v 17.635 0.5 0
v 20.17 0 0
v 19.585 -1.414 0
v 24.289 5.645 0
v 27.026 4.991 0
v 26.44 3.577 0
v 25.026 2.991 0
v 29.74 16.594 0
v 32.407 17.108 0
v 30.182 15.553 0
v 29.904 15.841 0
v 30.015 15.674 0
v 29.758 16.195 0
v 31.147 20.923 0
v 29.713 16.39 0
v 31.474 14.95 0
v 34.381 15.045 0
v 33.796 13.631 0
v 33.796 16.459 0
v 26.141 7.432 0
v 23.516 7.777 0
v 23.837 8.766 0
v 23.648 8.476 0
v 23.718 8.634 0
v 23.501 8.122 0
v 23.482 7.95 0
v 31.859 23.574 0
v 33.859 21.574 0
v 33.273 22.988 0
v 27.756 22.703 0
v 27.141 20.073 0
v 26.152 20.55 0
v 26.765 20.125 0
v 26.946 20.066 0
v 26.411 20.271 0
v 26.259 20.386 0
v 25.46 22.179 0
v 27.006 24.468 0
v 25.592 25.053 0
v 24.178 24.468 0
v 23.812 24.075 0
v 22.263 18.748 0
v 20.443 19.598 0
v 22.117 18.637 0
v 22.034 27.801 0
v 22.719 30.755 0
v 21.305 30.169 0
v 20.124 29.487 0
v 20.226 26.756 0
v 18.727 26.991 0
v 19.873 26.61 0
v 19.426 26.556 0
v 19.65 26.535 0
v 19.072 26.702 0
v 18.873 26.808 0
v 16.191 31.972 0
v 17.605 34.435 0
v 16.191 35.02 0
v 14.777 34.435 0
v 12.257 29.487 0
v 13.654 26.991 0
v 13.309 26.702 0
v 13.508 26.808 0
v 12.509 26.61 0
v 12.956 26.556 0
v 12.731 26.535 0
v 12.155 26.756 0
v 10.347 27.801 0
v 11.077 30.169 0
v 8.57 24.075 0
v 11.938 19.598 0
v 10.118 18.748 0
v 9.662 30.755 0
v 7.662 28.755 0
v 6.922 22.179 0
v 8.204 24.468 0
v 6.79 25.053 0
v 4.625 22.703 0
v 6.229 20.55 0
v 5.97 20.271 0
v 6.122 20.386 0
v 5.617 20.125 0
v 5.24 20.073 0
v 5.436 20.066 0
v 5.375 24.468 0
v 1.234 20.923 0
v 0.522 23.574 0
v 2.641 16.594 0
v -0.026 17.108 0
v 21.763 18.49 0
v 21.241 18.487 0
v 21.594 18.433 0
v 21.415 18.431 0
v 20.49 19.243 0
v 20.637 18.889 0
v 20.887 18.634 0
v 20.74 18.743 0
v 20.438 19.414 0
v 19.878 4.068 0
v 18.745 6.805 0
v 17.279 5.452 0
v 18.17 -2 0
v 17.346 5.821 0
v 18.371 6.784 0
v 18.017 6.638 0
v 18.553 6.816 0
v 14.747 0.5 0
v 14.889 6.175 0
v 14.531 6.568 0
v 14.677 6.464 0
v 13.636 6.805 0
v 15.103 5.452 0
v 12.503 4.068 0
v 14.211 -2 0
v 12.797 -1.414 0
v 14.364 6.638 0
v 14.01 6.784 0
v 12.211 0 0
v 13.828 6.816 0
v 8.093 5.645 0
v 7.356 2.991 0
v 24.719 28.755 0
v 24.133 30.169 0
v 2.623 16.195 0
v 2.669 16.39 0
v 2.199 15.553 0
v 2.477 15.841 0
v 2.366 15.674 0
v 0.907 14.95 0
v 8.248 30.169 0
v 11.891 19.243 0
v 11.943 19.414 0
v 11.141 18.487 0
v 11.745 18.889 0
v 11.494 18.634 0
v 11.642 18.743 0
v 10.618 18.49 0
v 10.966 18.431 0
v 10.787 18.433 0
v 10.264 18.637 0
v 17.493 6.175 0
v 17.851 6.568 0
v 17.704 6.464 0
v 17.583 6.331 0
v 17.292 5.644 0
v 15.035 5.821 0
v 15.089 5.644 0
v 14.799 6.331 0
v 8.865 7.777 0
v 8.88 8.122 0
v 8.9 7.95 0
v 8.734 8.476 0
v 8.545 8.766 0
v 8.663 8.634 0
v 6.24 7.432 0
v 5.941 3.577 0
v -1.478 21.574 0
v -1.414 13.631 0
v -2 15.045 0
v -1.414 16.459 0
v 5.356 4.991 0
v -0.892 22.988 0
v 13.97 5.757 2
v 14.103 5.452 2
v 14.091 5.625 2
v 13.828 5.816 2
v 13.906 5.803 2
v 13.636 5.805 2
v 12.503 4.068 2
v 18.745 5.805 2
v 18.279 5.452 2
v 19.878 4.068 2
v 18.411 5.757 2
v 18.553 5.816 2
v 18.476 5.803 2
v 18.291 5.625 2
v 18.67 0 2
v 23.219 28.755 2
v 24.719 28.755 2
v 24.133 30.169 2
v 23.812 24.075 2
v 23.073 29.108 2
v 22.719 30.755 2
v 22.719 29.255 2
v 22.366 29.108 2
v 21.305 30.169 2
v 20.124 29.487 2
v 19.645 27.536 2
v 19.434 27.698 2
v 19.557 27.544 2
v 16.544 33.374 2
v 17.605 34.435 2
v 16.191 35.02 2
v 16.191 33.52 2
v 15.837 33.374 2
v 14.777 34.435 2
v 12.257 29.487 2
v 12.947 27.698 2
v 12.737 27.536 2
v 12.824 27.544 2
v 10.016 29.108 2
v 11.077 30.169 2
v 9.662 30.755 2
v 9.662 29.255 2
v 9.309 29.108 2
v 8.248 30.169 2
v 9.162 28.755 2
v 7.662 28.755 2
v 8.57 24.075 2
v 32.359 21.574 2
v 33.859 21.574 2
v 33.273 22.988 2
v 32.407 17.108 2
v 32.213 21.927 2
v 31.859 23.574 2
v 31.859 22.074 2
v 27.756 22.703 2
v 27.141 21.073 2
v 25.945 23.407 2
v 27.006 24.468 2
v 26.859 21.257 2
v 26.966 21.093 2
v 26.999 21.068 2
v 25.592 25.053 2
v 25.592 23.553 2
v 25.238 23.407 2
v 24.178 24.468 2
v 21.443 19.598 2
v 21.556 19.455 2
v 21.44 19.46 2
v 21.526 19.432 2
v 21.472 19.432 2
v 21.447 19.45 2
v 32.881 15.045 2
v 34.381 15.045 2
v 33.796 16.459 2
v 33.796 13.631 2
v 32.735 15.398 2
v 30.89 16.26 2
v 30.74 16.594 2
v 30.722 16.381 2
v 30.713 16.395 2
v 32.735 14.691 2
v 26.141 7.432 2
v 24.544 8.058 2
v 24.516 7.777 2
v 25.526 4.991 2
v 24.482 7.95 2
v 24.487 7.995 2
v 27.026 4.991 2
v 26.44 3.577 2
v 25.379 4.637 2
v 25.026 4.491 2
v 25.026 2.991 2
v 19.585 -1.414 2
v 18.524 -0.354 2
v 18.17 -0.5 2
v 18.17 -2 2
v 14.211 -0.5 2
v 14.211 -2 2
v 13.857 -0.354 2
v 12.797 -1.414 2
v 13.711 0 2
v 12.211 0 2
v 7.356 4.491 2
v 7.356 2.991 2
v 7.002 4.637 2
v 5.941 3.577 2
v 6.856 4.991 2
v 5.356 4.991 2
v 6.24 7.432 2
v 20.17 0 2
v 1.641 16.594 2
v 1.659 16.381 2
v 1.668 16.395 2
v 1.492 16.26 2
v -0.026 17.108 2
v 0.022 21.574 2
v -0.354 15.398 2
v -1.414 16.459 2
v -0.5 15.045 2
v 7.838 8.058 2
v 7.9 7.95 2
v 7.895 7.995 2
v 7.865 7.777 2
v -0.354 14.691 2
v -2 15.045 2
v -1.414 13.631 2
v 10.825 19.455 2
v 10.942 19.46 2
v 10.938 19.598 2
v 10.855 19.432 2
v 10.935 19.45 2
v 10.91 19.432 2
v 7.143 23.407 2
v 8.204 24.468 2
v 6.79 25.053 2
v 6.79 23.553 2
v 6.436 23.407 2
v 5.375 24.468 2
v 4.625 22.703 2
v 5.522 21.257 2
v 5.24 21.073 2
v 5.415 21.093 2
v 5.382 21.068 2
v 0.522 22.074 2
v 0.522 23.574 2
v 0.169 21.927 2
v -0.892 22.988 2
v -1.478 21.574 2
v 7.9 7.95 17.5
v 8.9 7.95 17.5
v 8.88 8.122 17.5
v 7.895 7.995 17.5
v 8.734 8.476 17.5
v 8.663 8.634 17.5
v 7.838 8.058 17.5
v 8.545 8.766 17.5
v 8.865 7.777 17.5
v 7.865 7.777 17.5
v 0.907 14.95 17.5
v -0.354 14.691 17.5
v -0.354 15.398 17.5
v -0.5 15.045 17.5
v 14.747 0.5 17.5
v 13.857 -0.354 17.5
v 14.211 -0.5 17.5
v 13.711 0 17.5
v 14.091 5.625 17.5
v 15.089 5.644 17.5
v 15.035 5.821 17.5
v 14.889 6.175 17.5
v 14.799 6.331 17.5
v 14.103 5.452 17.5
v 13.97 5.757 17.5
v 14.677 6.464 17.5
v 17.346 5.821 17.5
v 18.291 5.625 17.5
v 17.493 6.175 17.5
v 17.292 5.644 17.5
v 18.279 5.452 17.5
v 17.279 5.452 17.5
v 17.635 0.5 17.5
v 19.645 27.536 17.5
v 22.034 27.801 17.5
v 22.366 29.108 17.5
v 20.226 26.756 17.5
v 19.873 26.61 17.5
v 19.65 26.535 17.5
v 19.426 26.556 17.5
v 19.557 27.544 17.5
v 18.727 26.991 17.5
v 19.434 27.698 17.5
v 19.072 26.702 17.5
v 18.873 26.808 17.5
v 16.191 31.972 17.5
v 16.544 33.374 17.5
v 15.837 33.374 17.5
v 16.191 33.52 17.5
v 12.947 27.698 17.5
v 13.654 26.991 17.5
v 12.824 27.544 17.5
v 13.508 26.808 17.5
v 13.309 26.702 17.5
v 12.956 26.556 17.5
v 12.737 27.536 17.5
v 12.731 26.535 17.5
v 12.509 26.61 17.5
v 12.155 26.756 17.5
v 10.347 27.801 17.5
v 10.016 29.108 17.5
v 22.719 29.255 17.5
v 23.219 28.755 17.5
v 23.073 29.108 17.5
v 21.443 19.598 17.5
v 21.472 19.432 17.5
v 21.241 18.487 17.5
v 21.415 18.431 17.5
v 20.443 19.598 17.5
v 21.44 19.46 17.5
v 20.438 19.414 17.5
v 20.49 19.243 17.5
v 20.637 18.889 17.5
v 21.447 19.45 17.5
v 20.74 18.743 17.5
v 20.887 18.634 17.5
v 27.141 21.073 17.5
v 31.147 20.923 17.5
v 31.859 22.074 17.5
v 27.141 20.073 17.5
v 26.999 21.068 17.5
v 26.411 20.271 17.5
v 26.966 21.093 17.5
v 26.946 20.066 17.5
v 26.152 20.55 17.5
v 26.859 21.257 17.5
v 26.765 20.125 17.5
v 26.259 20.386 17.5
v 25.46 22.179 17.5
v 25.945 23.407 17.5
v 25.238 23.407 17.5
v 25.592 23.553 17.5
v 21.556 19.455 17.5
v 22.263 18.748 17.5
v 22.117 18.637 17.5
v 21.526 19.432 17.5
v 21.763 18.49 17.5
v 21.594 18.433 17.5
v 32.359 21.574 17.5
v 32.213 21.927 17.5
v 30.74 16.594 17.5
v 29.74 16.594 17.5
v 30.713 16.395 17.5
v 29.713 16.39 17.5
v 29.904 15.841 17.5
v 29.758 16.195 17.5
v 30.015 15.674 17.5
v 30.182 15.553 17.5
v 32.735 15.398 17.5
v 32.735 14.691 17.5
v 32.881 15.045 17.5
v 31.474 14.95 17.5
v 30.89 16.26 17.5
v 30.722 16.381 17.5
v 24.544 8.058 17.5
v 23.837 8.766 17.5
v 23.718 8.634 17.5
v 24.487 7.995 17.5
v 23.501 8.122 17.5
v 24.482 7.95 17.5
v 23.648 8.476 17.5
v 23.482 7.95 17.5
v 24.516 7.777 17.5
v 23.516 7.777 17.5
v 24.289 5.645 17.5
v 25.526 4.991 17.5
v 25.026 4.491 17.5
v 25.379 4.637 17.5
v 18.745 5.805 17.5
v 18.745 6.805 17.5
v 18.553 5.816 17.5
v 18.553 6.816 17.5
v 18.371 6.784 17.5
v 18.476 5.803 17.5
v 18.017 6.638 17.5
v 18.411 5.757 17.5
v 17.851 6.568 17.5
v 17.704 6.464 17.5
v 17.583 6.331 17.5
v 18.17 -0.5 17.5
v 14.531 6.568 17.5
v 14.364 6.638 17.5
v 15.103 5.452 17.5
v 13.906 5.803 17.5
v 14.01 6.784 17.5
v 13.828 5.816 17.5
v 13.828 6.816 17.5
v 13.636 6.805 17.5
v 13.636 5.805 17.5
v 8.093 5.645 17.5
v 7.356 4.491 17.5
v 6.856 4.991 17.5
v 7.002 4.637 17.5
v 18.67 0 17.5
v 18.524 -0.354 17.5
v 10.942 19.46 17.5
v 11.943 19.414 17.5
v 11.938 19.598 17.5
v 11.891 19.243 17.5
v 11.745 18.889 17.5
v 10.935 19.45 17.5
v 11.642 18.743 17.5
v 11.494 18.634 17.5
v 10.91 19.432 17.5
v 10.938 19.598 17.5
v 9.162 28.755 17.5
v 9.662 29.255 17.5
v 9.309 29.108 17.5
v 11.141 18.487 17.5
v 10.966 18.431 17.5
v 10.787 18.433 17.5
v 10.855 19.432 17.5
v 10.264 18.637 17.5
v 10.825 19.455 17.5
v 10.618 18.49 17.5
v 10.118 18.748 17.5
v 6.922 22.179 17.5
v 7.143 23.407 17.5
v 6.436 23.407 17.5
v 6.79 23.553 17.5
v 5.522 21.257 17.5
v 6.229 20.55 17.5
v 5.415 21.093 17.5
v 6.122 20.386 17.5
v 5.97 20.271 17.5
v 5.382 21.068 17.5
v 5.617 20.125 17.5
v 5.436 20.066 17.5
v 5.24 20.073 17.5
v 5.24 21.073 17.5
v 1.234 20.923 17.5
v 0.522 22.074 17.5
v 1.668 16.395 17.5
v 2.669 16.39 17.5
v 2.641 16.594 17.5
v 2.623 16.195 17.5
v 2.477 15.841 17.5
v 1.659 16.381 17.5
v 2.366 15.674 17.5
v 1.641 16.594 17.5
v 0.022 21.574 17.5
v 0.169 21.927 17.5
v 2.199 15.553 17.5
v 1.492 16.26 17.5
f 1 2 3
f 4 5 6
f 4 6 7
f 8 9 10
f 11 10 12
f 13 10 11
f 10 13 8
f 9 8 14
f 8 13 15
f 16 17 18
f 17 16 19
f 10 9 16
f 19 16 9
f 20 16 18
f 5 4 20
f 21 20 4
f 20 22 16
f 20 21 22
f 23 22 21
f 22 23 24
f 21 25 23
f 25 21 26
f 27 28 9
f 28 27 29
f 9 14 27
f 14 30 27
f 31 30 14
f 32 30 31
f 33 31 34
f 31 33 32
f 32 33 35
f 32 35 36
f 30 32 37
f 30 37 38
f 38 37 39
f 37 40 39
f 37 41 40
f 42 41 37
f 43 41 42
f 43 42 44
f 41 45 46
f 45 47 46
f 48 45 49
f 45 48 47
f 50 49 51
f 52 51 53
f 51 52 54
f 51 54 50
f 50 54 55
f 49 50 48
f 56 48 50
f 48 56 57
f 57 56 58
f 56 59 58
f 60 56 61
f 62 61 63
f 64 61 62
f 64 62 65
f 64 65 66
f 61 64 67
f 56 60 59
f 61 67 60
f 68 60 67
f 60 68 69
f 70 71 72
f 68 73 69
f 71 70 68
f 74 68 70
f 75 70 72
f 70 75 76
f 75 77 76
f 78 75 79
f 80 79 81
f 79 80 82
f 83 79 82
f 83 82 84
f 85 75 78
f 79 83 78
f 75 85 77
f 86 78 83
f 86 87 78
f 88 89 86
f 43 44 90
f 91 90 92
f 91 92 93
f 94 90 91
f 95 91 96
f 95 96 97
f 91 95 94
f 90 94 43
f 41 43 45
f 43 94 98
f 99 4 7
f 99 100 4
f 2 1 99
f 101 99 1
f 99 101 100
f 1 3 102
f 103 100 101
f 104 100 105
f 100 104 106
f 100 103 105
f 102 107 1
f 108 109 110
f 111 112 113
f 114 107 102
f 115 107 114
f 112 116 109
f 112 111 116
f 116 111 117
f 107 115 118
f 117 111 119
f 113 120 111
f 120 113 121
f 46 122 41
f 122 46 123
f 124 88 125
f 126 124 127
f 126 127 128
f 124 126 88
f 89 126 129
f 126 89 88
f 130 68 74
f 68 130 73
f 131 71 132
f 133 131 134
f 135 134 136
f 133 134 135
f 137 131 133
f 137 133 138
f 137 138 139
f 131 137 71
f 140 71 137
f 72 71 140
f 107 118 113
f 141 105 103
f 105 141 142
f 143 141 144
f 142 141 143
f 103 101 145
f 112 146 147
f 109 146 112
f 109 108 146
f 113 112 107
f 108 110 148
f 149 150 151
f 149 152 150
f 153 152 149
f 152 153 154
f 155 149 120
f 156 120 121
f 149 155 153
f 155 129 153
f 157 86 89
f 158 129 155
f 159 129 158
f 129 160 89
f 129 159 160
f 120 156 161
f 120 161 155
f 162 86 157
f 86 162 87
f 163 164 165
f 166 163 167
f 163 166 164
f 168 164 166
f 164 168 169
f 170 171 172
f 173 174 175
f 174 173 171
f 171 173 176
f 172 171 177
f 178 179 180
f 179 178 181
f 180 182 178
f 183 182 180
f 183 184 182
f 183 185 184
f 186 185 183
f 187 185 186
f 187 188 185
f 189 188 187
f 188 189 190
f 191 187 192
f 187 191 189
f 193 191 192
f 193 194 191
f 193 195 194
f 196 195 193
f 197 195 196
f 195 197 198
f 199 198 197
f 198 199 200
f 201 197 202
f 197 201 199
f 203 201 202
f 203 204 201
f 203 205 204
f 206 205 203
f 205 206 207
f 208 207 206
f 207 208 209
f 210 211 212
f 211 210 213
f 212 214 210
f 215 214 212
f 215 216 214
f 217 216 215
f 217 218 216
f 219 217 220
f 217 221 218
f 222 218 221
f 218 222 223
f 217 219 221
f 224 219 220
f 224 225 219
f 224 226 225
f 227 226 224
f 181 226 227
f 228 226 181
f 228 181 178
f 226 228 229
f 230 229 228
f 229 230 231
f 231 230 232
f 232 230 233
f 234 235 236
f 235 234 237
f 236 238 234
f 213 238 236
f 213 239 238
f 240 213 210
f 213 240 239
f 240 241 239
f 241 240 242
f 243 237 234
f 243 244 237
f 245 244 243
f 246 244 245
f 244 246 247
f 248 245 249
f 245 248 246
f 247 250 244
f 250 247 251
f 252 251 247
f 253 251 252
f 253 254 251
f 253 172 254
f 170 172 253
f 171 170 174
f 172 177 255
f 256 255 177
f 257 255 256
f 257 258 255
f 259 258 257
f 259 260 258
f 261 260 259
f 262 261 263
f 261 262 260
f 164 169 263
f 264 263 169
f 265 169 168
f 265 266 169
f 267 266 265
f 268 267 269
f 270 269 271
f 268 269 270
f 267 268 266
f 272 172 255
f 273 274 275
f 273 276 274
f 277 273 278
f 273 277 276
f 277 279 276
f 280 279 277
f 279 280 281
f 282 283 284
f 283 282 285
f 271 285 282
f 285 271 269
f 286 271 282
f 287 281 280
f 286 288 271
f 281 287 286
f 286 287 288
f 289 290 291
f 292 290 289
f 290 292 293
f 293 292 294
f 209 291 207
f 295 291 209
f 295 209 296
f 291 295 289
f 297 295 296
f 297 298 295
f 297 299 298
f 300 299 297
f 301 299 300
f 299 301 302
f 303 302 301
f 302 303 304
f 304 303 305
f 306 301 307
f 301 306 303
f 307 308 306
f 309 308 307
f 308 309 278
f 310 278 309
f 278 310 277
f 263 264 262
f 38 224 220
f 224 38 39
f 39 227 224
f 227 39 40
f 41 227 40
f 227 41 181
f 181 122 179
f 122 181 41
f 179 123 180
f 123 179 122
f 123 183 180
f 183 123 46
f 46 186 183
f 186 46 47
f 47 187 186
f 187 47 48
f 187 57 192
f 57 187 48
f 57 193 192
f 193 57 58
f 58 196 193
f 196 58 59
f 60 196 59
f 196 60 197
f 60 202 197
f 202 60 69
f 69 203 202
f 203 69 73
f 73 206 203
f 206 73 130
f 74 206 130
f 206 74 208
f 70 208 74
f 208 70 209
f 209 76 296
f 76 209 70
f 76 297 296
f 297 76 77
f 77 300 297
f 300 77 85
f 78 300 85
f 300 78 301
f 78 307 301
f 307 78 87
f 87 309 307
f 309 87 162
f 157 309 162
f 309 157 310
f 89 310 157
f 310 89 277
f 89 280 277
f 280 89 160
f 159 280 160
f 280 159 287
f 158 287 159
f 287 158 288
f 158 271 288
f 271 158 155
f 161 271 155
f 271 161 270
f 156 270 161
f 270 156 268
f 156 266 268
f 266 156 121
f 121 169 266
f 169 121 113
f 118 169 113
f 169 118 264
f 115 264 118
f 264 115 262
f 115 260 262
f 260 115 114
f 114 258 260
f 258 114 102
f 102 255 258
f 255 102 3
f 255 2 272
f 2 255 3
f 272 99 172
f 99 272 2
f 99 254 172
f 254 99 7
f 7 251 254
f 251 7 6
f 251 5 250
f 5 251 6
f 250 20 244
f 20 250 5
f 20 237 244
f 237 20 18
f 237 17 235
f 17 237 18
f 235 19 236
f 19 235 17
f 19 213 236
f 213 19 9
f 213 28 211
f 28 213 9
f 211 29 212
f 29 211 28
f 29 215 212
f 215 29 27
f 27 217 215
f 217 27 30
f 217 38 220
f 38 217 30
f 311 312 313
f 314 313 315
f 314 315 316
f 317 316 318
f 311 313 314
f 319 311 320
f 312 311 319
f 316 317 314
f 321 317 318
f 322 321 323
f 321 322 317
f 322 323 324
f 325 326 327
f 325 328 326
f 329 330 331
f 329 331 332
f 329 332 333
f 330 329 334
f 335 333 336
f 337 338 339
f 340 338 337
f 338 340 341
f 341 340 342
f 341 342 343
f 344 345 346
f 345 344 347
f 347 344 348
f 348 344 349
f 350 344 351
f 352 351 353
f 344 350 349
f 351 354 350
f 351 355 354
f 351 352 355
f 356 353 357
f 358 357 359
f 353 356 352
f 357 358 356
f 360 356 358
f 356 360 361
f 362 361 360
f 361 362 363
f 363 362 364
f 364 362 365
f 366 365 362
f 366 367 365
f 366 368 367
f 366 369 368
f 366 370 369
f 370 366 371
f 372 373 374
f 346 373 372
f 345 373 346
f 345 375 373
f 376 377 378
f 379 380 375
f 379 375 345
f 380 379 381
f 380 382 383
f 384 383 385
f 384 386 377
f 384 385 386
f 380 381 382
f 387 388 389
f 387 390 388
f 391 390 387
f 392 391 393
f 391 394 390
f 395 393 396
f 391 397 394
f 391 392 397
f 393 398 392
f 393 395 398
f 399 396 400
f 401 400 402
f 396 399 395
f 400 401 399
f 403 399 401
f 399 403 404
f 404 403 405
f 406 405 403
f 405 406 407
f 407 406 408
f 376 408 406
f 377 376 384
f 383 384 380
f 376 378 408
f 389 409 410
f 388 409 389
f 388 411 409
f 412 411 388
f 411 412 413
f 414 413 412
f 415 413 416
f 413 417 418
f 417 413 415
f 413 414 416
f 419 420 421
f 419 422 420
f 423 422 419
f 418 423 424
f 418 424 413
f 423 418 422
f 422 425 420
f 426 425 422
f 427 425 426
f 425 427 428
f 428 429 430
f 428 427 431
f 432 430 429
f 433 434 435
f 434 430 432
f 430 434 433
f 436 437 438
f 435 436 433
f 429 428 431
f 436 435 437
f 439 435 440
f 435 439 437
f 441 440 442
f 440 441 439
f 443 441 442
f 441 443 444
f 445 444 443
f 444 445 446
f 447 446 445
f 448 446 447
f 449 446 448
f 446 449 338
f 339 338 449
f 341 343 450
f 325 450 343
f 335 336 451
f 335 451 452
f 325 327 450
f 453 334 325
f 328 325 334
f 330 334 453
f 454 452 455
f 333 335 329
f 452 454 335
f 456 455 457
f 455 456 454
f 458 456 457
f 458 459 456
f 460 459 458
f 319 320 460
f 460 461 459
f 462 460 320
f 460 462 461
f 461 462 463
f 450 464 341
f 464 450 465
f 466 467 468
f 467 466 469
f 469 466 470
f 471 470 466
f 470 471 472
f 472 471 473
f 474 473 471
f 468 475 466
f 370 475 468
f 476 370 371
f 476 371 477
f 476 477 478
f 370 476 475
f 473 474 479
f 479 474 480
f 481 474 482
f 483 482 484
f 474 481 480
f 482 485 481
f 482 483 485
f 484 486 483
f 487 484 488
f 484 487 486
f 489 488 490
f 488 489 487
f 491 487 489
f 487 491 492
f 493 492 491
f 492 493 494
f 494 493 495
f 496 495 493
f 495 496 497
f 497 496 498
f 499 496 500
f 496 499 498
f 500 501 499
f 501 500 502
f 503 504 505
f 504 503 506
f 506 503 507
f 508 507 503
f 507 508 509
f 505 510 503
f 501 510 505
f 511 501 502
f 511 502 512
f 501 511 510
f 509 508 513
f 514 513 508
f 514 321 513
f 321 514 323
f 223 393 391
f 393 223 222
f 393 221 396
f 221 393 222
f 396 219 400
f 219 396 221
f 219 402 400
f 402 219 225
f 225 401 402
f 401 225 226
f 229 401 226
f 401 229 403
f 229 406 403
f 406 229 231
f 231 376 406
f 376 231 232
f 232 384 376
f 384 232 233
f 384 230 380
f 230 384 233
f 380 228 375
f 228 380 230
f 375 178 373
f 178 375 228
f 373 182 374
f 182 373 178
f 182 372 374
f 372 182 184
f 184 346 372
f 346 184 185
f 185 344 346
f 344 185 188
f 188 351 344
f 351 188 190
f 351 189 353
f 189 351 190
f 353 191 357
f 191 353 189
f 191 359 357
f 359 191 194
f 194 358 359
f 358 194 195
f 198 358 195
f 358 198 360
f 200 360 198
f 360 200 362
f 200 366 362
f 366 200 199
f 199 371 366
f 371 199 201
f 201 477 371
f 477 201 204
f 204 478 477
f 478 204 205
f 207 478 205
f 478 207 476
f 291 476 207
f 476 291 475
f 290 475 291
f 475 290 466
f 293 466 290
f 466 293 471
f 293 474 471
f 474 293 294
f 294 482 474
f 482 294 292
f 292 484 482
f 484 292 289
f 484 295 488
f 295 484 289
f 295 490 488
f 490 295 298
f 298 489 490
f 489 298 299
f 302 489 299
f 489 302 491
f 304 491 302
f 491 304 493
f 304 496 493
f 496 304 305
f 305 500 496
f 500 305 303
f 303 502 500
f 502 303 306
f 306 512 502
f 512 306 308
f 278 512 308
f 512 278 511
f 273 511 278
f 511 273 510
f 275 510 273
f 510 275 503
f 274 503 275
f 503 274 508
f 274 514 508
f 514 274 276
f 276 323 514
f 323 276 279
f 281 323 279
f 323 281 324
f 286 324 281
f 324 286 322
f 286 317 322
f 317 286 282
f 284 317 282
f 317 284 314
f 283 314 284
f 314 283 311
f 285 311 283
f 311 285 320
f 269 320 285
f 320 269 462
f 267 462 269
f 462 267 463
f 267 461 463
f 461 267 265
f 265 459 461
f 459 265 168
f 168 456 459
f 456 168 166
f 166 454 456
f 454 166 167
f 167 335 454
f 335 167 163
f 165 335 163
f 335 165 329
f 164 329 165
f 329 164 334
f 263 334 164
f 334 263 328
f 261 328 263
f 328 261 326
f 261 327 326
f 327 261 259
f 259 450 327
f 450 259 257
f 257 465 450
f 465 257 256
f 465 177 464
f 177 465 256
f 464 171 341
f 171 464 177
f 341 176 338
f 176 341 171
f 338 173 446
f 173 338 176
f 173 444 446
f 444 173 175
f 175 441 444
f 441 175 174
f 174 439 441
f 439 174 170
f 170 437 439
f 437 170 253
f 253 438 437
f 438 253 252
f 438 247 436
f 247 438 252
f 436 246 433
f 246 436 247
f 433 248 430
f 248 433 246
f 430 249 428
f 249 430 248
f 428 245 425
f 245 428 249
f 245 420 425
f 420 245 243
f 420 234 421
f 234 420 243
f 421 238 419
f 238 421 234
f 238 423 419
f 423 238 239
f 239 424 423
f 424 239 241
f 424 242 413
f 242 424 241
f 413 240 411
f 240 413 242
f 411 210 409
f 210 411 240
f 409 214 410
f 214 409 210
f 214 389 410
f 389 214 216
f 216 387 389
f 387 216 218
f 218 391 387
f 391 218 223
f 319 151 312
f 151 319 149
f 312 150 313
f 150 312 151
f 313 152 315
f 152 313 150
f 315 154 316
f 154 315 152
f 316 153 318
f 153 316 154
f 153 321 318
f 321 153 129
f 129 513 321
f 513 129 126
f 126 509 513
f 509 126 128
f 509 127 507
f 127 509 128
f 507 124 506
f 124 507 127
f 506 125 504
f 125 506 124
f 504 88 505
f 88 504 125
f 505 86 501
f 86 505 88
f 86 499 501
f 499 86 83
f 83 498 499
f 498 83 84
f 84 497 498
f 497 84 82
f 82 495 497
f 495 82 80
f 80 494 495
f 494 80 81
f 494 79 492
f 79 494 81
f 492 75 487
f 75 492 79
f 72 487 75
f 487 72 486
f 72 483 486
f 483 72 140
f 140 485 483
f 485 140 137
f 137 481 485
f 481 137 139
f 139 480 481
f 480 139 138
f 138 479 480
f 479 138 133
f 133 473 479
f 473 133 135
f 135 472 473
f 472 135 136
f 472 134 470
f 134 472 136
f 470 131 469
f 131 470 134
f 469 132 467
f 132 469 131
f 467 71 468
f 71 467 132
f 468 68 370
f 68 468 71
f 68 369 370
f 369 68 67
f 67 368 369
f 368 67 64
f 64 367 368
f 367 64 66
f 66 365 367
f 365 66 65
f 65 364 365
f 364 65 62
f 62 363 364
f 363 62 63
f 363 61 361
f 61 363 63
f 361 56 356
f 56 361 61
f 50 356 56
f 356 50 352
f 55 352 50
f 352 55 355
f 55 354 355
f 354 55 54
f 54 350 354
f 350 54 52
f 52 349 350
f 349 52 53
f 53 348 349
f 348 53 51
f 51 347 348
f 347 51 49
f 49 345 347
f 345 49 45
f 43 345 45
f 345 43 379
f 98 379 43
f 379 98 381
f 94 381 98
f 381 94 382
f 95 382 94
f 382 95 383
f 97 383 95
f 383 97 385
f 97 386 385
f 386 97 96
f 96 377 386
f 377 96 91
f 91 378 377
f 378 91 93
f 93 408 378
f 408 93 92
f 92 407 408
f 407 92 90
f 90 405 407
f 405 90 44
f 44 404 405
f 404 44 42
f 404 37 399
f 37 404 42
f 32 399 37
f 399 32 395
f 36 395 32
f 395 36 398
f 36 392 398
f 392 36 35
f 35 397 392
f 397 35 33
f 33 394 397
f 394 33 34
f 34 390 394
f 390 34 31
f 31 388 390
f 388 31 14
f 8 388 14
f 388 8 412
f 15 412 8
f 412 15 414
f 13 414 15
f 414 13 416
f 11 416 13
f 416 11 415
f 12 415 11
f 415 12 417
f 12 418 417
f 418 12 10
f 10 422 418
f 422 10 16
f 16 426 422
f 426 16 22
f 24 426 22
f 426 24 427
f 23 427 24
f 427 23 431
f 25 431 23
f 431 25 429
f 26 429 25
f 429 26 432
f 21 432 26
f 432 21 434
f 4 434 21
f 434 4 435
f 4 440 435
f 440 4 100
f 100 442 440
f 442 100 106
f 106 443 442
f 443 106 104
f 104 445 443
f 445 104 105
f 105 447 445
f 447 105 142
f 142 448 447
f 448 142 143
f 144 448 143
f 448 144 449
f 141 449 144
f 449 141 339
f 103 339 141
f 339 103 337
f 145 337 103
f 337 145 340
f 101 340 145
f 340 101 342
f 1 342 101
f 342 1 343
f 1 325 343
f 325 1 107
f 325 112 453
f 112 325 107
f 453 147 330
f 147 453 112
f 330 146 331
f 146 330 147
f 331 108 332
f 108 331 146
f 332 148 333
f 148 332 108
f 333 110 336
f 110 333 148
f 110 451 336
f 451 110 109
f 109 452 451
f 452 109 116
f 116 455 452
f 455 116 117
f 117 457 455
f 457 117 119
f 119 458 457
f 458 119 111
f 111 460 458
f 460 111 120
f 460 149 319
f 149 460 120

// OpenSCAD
// Source: https://www.thingiverse.com/thing:3723344
//         by Alexander Pruss (arpruss)
// OpenSCAD file automatically generated by svg2cookiercutter.py
wallHeight = 17.5;
wallFlareWidth = 4;
wallFlareThickness = 2;
minWallWidth = 1;
maxWallWidth = 3;
insideWallFlareWidth = 2;
insideWallFlareThickness = 1.5;
minInsideWallWidth = 1;
maxInsideWallWidth = 3;
featureHeight = 8;
minFeatureThickness = 0.8;
maxFeatureThickness = 3;
connectorThickness = 1;
I2MM = 25.4;
// Small is 1"
// Large is 1.3" (was 1.5")  
size = 1.3 * I2MM; // 101.760;

module dummy() {}

scale = size/101.760;

module ribbon(points, thickness=1, closed=false) {
    p = closed ? concat(points, [points[0]]) : points;
    
    union() {
        for (i=[1:len(p)-1]) {
            hull() {
                translate(p[i-1]) circle(d=thickness, $fn=8);
                translate(p[i]) circle(d=thickness, $fn=8);
            }
        }
    }
}

module cookieCutter() {

path0=scale*[[-59.358,1.655],[-58.151,18.458],[-58.192,19.049],[-58.359,19.594],[-58.637,20.077],[-59.010,20.486],[-59.462,20.805],[-59.976,21.021],[-60.537,21.120],[-61.129,21.087],[-80.485,17.036],[-77.373,25.621],[-77.267,26.156],[-77.327,26.686],[-77.545,27.173],[-77.910,27.579],[-103.153,48.020],[-97.466,50.676],[-96.950,51.048],[-96.609,51.563],[-96.469,52.165],[-96.554,52.795],[-101.543,68.140],[-87.004,65.055],[-86.401,65.035],[-85.843,65.215],[-85.375,65.569],[-85.046,66.074],[-82.229,72.700],[-70.882,60.521],[-70.431,60.179],[-69.909,60.002],[-69.358,59.996],[-68.820,60.170],[-68.365,60.506],[-68.048,60.957],[-67.888,61.485],[-67.904,62.050],[-73.376,90.271],[-64.604,85.201],[-63.919,84.972],[-63.227,85.034],[-62.613,85.360],[-62.163,85.925],[-53.257,103.416],[-44.351,85.925],[-43.901,85.360],[-43.287,85.034],[-42.595,84.972],[-41.910,85.201],[-33.138,90.271],[-38.610,62.050],[-38.626,61.485],[-38.466,60.957],[-38.149,60.506],[-37.694,60.170],[-37.156,59.996],[-36.605,60.002],[-36.083,60.179],[-35.632,60.521],[-24.285,72.700],[-21.468,66.074],[-21.139,65.569],[-20.671,65.215],[-20.113,65.035],[-19.510,65.055],[-4.971,68.140],[-9.960,52.795],[-10.045,52.165],[-9.905,51.563],[-9.564,51.048],[-9.048,50.676],[-3.361,48.020],[-28.604,27.579],[-28.969,27.173],[-29.187,26.686],[-29.247,26.156],[-29.141,25.621],[-26.029,17.036],[-45.385,21.087],[-45.977,21.120],[-46.538,21.021],[-47.052,20.805],[-47.504,20.486],[-47.877,20.077],[-48.155,19.594],[-48.322,19.049],[-48.363,18.458],[-47.156,1.655],[-59.358,1.655]];
render(convexity=10) linear_extrude(height=(wallHeight)) ribbon(path0,thickness=min(maxWallWidth,max(0.027,minWallWidth)));
difference() {
 render(convexity=10) linear_extrude(height=wallFlareThickness) ribbon(path0,thickness=wallFlareWidth);
 translate([0,0,-0.01]) linear_extrude(height=wallFlareThickness+0.02) polygon(points=path0);
}
}

translate([103.153*scale,-1.655*scale,0]) cookieCutter();
